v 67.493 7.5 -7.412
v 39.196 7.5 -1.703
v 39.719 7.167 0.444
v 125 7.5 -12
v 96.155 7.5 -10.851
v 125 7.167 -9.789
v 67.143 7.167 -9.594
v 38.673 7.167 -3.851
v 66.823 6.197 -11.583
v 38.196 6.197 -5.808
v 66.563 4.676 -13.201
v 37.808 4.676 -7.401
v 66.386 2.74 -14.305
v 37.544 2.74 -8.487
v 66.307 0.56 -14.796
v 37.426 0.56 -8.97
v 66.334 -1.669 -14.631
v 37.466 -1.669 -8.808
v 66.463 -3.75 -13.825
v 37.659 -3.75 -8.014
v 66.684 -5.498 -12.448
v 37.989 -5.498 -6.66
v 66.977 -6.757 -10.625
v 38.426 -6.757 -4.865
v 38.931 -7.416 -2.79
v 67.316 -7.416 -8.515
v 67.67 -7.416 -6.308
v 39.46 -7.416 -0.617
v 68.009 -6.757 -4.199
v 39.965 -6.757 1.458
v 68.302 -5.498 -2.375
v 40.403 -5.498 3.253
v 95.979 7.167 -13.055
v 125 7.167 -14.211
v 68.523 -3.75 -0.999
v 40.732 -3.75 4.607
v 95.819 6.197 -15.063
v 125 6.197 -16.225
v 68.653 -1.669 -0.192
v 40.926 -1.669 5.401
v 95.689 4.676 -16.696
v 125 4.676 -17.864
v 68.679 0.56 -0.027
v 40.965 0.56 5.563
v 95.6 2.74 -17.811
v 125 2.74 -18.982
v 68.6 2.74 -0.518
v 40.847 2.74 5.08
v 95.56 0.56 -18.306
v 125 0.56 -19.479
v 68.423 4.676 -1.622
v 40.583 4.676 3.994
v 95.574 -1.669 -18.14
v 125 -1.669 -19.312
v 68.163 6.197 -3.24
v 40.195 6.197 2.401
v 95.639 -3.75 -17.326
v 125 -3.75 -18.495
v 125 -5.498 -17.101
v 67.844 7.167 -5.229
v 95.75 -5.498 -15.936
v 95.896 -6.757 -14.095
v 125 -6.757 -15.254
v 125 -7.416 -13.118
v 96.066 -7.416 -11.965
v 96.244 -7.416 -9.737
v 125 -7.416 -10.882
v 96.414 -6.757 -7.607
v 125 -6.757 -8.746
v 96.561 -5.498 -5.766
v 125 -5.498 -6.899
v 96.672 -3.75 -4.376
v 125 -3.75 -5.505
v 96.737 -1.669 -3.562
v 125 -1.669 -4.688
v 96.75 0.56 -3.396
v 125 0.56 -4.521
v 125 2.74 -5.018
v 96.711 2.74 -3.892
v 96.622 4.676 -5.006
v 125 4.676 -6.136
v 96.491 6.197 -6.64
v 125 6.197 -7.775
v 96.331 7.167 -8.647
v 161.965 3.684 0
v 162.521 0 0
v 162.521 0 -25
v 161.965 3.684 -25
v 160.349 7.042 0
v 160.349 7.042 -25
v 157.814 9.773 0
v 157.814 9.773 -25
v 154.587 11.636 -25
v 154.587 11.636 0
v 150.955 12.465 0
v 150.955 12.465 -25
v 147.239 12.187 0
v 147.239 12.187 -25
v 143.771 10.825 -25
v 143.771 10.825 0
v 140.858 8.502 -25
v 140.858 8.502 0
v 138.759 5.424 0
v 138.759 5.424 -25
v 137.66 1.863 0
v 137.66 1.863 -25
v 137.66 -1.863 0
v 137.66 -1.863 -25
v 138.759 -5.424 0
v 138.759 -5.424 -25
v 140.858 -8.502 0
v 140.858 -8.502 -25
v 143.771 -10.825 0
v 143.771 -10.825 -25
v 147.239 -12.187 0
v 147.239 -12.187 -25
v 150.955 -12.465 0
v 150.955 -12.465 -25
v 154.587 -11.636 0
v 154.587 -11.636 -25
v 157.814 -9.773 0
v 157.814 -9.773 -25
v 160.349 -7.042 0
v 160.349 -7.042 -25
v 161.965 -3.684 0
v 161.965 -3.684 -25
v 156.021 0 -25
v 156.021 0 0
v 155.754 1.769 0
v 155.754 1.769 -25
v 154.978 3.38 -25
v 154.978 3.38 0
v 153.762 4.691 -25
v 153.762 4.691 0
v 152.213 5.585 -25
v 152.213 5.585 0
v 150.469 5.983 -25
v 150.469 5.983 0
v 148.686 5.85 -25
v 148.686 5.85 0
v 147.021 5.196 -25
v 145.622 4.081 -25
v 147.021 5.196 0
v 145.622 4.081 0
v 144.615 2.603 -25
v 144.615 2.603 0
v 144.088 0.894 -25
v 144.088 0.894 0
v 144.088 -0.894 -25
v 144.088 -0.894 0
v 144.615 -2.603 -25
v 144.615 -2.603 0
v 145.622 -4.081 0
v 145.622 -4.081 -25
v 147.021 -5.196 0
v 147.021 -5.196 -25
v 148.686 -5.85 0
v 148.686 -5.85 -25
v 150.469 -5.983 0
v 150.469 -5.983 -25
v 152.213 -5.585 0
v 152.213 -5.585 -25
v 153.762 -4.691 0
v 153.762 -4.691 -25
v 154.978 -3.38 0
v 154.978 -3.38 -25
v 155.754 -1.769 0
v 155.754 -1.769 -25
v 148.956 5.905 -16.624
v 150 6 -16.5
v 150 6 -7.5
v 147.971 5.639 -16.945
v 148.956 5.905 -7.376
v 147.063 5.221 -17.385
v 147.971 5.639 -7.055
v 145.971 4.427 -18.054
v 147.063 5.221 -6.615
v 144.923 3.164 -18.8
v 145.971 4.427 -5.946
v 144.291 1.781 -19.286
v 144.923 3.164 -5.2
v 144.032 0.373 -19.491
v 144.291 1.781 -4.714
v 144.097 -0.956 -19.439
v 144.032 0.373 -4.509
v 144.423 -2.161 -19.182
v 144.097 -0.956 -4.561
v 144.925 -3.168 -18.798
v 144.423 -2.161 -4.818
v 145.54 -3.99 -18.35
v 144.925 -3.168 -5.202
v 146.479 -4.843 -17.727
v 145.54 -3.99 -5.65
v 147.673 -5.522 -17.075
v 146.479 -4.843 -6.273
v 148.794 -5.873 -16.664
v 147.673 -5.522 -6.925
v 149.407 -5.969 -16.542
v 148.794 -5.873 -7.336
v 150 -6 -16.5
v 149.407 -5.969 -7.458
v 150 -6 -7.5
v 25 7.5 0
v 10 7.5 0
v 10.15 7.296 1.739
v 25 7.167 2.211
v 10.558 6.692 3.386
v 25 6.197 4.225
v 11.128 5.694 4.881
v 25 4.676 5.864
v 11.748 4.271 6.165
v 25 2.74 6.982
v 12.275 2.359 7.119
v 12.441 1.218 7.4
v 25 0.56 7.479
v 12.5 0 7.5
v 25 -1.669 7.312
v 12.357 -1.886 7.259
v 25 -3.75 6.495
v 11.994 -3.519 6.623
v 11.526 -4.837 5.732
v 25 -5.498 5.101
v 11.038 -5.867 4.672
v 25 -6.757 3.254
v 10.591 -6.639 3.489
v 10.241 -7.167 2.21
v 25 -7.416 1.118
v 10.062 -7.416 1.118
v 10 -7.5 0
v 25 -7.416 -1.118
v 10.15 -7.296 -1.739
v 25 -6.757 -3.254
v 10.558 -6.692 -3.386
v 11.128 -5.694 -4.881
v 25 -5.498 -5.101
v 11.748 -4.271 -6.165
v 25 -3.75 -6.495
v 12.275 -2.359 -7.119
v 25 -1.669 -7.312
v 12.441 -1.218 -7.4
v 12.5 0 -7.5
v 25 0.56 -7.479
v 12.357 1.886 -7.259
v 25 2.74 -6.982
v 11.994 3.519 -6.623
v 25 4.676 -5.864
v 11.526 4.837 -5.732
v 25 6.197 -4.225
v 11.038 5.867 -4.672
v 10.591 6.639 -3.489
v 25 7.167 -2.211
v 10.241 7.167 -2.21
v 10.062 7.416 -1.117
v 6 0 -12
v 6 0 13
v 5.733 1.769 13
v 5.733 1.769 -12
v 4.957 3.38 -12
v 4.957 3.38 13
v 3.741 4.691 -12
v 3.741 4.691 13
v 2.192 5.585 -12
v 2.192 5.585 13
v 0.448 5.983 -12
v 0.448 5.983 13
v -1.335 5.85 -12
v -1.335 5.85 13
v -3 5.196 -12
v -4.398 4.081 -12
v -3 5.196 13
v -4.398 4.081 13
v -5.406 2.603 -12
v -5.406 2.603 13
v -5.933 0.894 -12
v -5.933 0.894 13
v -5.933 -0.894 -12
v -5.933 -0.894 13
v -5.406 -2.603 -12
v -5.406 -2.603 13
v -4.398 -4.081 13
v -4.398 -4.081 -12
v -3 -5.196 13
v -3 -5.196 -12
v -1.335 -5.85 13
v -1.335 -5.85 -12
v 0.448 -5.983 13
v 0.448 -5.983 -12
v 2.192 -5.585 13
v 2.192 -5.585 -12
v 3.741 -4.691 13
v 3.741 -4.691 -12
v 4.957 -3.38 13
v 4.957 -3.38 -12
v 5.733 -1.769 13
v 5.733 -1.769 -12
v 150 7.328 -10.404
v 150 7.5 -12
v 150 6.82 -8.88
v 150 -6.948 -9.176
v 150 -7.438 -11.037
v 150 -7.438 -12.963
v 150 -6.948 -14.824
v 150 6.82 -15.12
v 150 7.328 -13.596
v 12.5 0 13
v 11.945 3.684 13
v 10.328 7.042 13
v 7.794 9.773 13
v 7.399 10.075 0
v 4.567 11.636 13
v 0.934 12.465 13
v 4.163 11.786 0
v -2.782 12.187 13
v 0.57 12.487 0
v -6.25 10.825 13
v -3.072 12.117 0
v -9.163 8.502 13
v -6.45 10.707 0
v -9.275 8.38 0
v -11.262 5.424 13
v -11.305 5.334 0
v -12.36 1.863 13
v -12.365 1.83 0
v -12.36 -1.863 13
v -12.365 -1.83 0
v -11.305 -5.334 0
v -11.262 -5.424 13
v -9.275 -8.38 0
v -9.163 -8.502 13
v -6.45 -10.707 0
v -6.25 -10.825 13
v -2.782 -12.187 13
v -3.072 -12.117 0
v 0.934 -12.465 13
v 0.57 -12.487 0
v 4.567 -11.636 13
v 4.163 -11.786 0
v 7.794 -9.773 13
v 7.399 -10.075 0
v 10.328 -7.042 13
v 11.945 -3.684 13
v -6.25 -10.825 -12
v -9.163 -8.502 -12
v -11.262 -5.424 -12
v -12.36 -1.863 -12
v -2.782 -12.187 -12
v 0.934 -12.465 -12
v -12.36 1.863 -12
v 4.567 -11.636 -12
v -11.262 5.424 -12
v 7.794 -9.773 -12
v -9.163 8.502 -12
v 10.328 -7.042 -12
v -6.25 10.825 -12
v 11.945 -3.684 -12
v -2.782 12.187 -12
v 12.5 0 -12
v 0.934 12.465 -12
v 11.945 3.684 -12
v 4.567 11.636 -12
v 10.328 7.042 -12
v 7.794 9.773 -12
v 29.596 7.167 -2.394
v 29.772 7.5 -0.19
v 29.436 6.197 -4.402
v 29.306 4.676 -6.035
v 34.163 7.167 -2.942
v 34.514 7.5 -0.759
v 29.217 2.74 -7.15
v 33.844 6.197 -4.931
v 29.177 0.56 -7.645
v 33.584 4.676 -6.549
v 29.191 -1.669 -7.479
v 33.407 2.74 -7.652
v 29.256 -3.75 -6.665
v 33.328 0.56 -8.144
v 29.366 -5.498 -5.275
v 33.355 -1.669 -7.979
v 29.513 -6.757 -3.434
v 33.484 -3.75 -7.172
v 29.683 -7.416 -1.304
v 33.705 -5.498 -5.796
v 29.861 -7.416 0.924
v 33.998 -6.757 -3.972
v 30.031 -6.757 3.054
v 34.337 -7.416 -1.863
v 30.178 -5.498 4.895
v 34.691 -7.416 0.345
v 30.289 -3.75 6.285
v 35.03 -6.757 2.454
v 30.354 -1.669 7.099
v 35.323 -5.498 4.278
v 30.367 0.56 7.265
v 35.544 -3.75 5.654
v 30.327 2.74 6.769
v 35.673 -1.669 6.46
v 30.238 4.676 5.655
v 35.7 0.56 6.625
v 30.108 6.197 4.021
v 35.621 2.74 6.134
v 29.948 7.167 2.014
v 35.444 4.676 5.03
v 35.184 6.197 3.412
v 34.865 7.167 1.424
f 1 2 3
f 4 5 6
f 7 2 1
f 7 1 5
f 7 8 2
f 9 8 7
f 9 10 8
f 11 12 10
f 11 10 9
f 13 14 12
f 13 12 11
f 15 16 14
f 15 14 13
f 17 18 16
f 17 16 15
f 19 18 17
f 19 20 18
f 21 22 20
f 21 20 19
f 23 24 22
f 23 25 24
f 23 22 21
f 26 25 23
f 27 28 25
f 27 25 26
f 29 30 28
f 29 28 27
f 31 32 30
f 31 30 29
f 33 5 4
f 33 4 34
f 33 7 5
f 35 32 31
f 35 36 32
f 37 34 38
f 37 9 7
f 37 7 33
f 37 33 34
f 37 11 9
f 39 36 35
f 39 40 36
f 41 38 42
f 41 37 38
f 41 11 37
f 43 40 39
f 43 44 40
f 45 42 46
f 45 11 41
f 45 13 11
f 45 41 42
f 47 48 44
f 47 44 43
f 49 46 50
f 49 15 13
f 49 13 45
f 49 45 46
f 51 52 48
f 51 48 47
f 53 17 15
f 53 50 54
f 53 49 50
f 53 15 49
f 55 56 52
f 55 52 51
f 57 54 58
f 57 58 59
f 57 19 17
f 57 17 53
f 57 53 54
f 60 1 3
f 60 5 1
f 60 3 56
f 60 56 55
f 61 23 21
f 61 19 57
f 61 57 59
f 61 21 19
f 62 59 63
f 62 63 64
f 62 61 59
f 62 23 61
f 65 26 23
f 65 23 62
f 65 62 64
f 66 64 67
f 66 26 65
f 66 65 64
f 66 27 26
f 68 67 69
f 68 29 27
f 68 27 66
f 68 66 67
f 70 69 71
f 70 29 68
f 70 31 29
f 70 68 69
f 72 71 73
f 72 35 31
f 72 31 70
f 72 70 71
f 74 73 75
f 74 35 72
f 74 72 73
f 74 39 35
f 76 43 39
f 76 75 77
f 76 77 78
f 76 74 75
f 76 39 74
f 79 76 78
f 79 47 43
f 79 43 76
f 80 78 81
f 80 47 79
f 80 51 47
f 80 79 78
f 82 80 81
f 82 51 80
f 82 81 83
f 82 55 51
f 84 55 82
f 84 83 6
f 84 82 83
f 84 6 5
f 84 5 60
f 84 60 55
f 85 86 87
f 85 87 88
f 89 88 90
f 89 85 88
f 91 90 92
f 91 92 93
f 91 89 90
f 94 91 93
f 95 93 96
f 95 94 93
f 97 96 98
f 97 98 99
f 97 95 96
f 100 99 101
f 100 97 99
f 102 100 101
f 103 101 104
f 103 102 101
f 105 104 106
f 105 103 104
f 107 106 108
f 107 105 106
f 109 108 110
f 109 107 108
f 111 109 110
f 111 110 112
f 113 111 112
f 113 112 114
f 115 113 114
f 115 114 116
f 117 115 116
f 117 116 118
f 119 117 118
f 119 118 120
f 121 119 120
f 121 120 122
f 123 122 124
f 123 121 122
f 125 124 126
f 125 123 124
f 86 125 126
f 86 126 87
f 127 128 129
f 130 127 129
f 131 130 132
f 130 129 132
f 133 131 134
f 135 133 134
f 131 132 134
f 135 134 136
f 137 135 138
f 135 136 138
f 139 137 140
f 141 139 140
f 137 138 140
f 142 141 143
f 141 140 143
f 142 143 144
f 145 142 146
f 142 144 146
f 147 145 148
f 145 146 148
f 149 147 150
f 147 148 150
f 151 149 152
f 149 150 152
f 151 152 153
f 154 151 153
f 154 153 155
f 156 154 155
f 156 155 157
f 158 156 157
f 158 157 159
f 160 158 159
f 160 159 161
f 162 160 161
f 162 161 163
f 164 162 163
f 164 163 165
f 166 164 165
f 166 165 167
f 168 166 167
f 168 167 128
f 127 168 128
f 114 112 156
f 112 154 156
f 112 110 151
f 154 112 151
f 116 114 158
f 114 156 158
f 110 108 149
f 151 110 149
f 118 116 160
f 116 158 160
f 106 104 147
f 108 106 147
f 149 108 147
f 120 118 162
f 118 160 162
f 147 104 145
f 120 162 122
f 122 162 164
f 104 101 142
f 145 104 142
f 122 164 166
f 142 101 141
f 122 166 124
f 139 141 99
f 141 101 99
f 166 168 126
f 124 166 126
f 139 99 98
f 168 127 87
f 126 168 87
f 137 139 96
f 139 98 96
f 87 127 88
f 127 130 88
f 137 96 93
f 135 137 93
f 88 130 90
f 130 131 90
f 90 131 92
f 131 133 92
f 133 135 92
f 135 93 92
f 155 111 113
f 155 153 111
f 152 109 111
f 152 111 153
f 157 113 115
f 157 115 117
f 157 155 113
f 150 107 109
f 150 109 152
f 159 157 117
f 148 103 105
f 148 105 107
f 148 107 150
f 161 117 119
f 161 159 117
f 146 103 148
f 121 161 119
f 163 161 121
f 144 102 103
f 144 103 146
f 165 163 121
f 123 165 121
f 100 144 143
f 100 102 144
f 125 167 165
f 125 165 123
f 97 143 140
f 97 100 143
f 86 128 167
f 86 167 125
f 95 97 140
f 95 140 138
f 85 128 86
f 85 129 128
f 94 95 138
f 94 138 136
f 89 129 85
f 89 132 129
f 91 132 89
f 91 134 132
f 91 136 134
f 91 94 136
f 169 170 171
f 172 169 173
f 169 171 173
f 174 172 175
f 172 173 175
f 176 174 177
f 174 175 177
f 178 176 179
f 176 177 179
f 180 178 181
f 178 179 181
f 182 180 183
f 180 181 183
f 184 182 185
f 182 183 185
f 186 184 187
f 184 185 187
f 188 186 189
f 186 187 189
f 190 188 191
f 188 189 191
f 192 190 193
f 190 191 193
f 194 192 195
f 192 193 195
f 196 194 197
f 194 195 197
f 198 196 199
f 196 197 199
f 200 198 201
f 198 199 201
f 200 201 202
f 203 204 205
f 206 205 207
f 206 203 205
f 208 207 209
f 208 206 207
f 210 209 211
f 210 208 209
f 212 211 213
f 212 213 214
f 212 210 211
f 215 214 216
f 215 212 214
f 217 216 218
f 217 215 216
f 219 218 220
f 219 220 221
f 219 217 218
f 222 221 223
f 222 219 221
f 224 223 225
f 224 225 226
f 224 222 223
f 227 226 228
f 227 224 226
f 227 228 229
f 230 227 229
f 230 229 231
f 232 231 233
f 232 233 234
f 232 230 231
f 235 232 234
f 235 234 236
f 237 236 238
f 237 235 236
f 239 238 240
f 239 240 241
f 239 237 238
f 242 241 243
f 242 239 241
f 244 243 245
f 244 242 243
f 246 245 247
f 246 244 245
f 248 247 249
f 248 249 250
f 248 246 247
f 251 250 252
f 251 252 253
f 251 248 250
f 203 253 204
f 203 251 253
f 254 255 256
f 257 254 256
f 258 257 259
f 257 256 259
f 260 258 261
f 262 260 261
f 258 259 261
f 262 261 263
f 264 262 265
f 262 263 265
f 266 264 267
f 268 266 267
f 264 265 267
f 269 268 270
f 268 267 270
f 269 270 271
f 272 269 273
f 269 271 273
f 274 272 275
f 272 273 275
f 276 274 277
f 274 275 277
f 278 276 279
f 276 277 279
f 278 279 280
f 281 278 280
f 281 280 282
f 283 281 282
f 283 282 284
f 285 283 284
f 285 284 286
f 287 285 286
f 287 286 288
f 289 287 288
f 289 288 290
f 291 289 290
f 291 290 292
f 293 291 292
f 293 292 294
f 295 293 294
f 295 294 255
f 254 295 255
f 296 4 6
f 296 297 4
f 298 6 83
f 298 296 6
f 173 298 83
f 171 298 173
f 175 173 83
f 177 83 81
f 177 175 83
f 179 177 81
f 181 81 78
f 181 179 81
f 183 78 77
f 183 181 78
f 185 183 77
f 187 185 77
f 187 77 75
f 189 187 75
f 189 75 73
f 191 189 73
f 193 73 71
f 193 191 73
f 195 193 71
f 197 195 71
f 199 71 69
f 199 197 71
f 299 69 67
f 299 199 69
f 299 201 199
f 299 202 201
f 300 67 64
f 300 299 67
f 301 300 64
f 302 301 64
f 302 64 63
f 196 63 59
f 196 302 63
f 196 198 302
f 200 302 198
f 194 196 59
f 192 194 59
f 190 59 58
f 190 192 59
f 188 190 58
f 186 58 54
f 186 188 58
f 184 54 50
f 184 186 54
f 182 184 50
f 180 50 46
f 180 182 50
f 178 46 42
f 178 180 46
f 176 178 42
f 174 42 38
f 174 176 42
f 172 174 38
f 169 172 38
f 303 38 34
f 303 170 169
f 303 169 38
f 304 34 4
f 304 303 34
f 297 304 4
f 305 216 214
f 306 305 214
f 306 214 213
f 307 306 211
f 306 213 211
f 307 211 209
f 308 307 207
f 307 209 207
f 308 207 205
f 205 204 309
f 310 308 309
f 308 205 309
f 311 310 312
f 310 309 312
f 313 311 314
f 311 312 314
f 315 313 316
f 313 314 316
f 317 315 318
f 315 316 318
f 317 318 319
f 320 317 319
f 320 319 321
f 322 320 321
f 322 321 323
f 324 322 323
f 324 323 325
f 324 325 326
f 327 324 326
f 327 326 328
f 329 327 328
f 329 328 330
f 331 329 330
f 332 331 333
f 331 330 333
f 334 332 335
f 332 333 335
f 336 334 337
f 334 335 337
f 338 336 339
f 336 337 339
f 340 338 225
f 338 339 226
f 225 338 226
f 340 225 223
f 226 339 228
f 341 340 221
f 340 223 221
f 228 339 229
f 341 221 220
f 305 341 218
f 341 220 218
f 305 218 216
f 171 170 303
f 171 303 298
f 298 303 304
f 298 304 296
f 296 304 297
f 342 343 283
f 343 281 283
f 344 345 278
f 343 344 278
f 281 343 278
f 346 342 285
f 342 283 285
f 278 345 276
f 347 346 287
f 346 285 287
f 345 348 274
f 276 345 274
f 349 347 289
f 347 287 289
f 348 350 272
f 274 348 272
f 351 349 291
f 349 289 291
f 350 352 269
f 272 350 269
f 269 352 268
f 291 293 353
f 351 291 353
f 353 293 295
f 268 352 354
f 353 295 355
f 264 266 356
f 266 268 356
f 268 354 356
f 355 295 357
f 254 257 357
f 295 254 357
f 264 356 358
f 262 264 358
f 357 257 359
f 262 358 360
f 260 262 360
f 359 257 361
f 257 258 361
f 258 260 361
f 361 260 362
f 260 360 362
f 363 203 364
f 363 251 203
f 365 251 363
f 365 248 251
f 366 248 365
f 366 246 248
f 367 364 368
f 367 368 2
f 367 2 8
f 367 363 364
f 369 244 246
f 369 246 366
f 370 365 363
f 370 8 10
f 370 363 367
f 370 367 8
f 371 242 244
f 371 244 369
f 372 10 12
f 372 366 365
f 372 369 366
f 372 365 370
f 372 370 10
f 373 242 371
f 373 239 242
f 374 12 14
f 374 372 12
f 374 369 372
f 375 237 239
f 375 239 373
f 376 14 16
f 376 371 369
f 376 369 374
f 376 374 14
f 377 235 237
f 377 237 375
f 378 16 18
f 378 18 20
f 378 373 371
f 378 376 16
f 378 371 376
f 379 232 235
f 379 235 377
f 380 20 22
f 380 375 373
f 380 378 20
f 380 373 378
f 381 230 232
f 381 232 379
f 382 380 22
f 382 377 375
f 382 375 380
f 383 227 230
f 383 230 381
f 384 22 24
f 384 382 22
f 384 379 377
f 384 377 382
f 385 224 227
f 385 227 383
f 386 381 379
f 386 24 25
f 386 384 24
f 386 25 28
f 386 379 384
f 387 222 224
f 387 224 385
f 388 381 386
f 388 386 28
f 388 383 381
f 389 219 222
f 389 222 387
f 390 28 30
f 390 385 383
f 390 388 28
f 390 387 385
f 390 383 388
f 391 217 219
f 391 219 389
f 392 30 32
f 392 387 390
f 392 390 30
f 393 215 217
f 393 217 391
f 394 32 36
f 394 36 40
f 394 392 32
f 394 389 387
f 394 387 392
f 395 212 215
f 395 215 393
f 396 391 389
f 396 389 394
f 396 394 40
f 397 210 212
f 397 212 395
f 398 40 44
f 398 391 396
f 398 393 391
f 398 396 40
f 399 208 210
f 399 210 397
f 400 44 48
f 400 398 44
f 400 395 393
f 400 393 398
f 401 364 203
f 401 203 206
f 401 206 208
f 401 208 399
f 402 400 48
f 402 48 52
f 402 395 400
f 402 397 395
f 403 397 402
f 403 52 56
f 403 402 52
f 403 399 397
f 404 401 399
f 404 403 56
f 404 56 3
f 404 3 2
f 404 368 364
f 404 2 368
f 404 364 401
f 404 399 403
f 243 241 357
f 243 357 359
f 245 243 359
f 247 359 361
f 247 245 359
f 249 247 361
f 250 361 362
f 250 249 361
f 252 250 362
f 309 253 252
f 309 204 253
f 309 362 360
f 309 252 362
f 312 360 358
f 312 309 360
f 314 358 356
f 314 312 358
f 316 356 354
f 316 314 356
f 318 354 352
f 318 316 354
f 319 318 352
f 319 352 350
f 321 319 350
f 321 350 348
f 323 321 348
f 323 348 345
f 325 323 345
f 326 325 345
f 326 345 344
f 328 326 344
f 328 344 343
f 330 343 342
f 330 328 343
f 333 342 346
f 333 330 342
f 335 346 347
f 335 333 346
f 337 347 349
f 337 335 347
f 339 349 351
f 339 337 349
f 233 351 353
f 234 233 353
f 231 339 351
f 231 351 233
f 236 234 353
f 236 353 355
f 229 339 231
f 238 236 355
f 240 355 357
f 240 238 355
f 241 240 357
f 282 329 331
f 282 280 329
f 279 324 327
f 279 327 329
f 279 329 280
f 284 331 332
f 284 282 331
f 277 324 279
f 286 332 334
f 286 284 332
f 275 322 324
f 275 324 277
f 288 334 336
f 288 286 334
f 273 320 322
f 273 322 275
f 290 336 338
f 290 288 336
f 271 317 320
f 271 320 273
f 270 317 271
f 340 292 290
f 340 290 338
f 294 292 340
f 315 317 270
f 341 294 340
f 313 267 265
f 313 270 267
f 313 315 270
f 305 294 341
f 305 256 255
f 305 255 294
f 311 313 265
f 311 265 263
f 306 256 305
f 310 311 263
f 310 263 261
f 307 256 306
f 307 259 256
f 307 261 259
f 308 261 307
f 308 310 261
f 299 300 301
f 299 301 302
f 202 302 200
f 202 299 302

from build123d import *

# Parameters (mm, degrees)
F1_R          = 7.5
F3_R          = 12.5
F4_DEPTH      = 13
F4_DEPTH_BACK = 12
F5_R          = 6
F6_DEPTH      = 32.5010001
F7_R          = 12.5
F8_DEPTH      = 25
F9_R          = 6
F10_DEPTH     = 25.001


with BuildPart() as f2:
    # F2: sweep along a path in F0
    with BuildLine(Plane.XZ) as f2_path:
        Line((0, 0), (25, 0))
        ThreePointArc((25, 0), (32.1487132371, -0.4273896908), (39.1955835962, -1.7034700315))
        ThreePointArc((39.1955835962, -1.7034700315), (81.789999989, -9.4166667579), (125, -12))
        Line((125, -12), (150, -12))
    # F1 (on Right) → F2 (sweep)
    with BuildSketch(Plane.YZ):
        Circle(F1_R)
    sweep(path=f2_path.line)

    # F3 (on Top) → F4 (join, two sides)
    with BuildSketch(Plane.XY) as f4_sk:
        Circle(F3_R)
    extrude(amount=F4_DEPTH)
    extrude(f4_sk.sketch, amount=-F4_DEPTH_BACK)

    # F5 (on face) → F6 (cut, through all)
    with BuildSketch(Plane.XY.offset(13)):
        Circle(F5_R)
    extrude(amount=-F6_DEPTH, mode=Mode.SUBTRACT)


with BuildPart() as f8:
    # F7 (on Top) → F8 (new body)
    with BuildSketch(Plane.XY):
        with Locations((150.020673871, 0)):
            Circle(F7_R)
    extrude(amount=-F8_DEPTH)


with BuildPart() as f10_tool:
    # F9 (on face) → F10 (new body, through all)
    with BuildSketch(Plane.XY):
        with Locations((150.020673871, 0)):
            Circle(F9_R)
    extrude(amount=-F10_DEPTH)


with BuildPart() as f2_1:
    add(f2.part)

    # F10: cut by f10_tool
    add(f10_tool.part, mode=Mode.SUBTRACT)


with BuildPart() as f8_1:
    add(f8.part)

    # F10: cut by f10_tool
    add(f10_tool.part, mode=Mode.SUBTRACT)


solid = Compound([f2_1.part, f8_1.part])
